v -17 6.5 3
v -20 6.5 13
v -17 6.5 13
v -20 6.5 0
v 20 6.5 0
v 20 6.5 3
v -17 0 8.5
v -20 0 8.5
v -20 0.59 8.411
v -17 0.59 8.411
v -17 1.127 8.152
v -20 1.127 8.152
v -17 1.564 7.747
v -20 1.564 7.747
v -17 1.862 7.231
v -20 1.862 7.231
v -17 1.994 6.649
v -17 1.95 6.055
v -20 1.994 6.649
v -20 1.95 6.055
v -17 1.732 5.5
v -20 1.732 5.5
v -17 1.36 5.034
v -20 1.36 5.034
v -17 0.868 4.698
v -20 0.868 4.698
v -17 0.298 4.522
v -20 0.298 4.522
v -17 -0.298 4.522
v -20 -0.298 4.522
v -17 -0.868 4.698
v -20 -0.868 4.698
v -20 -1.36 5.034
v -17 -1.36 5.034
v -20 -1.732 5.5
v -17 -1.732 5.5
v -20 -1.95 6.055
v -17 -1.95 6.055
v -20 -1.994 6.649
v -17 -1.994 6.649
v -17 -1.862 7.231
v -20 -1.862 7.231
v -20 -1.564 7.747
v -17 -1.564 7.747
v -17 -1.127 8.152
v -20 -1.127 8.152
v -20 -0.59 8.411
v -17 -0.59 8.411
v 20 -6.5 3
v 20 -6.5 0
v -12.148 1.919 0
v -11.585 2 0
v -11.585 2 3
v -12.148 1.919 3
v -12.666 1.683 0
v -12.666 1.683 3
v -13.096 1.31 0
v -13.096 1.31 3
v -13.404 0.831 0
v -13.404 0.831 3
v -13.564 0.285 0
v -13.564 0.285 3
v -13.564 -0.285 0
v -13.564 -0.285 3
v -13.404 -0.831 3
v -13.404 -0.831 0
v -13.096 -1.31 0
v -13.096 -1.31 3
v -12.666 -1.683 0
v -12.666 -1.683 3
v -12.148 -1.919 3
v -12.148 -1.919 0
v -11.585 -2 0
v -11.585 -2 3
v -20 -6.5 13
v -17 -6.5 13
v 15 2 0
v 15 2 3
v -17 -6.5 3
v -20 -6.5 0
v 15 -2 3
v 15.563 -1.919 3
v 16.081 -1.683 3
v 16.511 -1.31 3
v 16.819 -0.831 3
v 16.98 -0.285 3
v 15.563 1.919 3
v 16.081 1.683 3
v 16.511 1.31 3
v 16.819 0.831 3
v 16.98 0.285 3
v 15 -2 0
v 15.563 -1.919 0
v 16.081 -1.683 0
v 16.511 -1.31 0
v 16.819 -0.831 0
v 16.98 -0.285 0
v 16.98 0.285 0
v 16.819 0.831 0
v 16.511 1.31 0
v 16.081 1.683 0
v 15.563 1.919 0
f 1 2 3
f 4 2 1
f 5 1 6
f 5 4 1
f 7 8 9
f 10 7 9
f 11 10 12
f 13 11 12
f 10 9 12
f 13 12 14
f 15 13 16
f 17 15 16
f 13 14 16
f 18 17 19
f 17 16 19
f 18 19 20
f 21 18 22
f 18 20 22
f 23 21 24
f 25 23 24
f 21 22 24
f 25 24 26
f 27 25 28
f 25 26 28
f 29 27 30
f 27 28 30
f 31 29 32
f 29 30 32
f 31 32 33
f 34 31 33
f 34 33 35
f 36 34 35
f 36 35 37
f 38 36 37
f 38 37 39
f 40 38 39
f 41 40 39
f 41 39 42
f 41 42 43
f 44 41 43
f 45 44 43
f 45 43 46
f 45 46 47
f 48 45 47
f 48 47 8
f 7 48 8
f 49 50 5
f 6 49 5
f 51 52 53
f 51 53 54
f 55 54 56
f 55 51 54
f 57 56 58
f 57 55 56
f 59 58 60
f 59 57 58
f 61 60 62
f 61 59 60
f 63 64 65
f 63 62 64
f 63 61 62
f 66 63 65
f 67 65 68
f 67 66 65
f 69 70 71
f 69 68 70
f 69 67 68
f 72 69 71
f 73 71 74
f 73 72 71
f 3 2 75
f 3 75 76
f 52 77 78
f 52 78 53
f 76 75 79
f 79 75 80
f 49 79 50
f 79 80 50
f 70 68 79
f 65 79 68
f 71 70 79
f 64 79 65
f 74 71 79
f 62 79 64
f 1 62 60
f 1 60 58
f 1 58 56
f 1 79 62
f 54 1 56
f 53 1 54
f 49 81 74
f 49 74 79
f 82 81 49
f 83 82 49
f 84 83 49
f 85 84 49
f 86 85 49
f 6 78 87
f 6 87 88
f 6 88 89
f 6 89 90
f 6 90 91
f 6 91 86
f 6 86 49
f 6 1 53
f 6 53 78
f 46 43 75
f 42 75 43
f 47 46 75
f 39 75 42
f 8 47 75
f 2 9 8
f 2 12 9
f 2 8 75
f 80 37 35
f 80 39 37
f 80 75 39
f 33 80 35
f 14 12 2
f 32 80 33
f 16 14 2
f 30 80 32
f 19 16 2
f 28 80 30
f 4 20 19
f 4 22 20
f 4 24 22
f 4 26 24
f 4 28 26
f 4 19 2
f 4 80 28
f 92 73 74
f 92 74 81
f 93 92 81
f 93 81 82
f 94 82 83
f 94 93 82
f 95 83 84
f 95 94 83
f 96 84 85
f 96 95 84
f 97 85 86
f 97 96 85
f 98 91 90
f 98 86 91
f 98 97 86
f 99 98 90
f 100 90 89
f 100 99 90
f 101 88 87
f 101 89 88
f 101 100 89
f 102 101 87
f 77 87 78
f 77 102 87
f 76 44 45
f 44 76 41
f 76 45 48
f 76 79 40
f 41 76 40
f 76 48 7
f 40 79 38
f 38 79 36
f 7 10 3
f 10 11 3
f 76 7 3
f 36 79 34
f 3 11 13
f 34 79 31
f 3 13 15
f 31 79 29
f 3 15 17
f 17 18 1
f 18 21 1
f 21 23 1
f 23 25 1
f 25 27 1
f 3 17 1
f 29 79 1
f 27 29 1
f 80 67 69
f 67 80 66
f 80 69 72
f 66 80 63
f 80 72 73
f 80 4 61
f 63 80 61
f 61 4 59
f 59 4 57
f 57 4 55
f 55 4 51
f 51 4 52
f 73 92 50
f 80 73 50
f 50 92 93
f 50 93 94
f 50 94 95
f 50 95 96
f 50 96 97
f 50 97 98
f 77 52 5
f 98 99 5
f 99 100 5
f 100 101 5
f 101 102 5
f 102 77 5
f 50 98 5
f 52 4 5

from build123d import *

# Parameters (mm, degrees)
SKETCH2_W           = 40
SKETCH2_H           = 13
BOSS_EXTRUDE1_DEPTH = 3
SKETCH3_W           = 3
SKETCH3_H           = 13
BOSS_EXTRUDE2_DEPTH = 10
SKETCH4_R           = 2
CUT_EXTRUDE1_DEPTH  = 12
CUT_EXTRUDE2_DEPTH  = 12


with BuildPart() as part:
    # Sketch2 → Boss-Extrude1 (new body)
    with BuildSketch(Plane.XY):
        Rectangle(SKETCH2_W, SKETCH2_H)
    extrude(amount=BOSS_EXTRUDE1_DEPTH)

    # Sketch3 → Boss-Extrude2 (add)
    with BuildSketch(Plane.XY.offset(3)):
        with Locations((-18.5, 0)):
            Rectangle(SKETCH3_W, SKETCH3_H)
    extrude(amount=BOSS_EXTRUDE2_DEPTH)

    # Sketch4 → Cut-Extrude1 (cut)
    with BuildSketch(Plane.ZY.offset(20)):
        with Locations((6.5, 0)):
            Circle(SKETCH4_R)
    extrude(amount=-CUT_EXTRUDE1_DEPTH, mode=Mode.SUBTRACT)

    # Sketch5 → Cut-Extrude2 (cut)
    with BuildSketch(Plane(origin=(0, 0, 0), x_dir=(-1, 0, 0), z_dir=(0, 0, -1))):
        with BuildLine():
            Line((-15, 2), (11.584611172, 2))
            ThreePointArc((11.584611172, 2), (13.584611172, 0), (11.584611172, -2))
            Line((11.584611172, -2), (-15, -2))
            ThreePointArc((-15, -2), (-17, 0), (-15, 2))
        make_face()
    extrude(amount=-CUT_EXTRUDE2_DEPTH, mode=Mode.SUBTRACT)


solid = part.part
